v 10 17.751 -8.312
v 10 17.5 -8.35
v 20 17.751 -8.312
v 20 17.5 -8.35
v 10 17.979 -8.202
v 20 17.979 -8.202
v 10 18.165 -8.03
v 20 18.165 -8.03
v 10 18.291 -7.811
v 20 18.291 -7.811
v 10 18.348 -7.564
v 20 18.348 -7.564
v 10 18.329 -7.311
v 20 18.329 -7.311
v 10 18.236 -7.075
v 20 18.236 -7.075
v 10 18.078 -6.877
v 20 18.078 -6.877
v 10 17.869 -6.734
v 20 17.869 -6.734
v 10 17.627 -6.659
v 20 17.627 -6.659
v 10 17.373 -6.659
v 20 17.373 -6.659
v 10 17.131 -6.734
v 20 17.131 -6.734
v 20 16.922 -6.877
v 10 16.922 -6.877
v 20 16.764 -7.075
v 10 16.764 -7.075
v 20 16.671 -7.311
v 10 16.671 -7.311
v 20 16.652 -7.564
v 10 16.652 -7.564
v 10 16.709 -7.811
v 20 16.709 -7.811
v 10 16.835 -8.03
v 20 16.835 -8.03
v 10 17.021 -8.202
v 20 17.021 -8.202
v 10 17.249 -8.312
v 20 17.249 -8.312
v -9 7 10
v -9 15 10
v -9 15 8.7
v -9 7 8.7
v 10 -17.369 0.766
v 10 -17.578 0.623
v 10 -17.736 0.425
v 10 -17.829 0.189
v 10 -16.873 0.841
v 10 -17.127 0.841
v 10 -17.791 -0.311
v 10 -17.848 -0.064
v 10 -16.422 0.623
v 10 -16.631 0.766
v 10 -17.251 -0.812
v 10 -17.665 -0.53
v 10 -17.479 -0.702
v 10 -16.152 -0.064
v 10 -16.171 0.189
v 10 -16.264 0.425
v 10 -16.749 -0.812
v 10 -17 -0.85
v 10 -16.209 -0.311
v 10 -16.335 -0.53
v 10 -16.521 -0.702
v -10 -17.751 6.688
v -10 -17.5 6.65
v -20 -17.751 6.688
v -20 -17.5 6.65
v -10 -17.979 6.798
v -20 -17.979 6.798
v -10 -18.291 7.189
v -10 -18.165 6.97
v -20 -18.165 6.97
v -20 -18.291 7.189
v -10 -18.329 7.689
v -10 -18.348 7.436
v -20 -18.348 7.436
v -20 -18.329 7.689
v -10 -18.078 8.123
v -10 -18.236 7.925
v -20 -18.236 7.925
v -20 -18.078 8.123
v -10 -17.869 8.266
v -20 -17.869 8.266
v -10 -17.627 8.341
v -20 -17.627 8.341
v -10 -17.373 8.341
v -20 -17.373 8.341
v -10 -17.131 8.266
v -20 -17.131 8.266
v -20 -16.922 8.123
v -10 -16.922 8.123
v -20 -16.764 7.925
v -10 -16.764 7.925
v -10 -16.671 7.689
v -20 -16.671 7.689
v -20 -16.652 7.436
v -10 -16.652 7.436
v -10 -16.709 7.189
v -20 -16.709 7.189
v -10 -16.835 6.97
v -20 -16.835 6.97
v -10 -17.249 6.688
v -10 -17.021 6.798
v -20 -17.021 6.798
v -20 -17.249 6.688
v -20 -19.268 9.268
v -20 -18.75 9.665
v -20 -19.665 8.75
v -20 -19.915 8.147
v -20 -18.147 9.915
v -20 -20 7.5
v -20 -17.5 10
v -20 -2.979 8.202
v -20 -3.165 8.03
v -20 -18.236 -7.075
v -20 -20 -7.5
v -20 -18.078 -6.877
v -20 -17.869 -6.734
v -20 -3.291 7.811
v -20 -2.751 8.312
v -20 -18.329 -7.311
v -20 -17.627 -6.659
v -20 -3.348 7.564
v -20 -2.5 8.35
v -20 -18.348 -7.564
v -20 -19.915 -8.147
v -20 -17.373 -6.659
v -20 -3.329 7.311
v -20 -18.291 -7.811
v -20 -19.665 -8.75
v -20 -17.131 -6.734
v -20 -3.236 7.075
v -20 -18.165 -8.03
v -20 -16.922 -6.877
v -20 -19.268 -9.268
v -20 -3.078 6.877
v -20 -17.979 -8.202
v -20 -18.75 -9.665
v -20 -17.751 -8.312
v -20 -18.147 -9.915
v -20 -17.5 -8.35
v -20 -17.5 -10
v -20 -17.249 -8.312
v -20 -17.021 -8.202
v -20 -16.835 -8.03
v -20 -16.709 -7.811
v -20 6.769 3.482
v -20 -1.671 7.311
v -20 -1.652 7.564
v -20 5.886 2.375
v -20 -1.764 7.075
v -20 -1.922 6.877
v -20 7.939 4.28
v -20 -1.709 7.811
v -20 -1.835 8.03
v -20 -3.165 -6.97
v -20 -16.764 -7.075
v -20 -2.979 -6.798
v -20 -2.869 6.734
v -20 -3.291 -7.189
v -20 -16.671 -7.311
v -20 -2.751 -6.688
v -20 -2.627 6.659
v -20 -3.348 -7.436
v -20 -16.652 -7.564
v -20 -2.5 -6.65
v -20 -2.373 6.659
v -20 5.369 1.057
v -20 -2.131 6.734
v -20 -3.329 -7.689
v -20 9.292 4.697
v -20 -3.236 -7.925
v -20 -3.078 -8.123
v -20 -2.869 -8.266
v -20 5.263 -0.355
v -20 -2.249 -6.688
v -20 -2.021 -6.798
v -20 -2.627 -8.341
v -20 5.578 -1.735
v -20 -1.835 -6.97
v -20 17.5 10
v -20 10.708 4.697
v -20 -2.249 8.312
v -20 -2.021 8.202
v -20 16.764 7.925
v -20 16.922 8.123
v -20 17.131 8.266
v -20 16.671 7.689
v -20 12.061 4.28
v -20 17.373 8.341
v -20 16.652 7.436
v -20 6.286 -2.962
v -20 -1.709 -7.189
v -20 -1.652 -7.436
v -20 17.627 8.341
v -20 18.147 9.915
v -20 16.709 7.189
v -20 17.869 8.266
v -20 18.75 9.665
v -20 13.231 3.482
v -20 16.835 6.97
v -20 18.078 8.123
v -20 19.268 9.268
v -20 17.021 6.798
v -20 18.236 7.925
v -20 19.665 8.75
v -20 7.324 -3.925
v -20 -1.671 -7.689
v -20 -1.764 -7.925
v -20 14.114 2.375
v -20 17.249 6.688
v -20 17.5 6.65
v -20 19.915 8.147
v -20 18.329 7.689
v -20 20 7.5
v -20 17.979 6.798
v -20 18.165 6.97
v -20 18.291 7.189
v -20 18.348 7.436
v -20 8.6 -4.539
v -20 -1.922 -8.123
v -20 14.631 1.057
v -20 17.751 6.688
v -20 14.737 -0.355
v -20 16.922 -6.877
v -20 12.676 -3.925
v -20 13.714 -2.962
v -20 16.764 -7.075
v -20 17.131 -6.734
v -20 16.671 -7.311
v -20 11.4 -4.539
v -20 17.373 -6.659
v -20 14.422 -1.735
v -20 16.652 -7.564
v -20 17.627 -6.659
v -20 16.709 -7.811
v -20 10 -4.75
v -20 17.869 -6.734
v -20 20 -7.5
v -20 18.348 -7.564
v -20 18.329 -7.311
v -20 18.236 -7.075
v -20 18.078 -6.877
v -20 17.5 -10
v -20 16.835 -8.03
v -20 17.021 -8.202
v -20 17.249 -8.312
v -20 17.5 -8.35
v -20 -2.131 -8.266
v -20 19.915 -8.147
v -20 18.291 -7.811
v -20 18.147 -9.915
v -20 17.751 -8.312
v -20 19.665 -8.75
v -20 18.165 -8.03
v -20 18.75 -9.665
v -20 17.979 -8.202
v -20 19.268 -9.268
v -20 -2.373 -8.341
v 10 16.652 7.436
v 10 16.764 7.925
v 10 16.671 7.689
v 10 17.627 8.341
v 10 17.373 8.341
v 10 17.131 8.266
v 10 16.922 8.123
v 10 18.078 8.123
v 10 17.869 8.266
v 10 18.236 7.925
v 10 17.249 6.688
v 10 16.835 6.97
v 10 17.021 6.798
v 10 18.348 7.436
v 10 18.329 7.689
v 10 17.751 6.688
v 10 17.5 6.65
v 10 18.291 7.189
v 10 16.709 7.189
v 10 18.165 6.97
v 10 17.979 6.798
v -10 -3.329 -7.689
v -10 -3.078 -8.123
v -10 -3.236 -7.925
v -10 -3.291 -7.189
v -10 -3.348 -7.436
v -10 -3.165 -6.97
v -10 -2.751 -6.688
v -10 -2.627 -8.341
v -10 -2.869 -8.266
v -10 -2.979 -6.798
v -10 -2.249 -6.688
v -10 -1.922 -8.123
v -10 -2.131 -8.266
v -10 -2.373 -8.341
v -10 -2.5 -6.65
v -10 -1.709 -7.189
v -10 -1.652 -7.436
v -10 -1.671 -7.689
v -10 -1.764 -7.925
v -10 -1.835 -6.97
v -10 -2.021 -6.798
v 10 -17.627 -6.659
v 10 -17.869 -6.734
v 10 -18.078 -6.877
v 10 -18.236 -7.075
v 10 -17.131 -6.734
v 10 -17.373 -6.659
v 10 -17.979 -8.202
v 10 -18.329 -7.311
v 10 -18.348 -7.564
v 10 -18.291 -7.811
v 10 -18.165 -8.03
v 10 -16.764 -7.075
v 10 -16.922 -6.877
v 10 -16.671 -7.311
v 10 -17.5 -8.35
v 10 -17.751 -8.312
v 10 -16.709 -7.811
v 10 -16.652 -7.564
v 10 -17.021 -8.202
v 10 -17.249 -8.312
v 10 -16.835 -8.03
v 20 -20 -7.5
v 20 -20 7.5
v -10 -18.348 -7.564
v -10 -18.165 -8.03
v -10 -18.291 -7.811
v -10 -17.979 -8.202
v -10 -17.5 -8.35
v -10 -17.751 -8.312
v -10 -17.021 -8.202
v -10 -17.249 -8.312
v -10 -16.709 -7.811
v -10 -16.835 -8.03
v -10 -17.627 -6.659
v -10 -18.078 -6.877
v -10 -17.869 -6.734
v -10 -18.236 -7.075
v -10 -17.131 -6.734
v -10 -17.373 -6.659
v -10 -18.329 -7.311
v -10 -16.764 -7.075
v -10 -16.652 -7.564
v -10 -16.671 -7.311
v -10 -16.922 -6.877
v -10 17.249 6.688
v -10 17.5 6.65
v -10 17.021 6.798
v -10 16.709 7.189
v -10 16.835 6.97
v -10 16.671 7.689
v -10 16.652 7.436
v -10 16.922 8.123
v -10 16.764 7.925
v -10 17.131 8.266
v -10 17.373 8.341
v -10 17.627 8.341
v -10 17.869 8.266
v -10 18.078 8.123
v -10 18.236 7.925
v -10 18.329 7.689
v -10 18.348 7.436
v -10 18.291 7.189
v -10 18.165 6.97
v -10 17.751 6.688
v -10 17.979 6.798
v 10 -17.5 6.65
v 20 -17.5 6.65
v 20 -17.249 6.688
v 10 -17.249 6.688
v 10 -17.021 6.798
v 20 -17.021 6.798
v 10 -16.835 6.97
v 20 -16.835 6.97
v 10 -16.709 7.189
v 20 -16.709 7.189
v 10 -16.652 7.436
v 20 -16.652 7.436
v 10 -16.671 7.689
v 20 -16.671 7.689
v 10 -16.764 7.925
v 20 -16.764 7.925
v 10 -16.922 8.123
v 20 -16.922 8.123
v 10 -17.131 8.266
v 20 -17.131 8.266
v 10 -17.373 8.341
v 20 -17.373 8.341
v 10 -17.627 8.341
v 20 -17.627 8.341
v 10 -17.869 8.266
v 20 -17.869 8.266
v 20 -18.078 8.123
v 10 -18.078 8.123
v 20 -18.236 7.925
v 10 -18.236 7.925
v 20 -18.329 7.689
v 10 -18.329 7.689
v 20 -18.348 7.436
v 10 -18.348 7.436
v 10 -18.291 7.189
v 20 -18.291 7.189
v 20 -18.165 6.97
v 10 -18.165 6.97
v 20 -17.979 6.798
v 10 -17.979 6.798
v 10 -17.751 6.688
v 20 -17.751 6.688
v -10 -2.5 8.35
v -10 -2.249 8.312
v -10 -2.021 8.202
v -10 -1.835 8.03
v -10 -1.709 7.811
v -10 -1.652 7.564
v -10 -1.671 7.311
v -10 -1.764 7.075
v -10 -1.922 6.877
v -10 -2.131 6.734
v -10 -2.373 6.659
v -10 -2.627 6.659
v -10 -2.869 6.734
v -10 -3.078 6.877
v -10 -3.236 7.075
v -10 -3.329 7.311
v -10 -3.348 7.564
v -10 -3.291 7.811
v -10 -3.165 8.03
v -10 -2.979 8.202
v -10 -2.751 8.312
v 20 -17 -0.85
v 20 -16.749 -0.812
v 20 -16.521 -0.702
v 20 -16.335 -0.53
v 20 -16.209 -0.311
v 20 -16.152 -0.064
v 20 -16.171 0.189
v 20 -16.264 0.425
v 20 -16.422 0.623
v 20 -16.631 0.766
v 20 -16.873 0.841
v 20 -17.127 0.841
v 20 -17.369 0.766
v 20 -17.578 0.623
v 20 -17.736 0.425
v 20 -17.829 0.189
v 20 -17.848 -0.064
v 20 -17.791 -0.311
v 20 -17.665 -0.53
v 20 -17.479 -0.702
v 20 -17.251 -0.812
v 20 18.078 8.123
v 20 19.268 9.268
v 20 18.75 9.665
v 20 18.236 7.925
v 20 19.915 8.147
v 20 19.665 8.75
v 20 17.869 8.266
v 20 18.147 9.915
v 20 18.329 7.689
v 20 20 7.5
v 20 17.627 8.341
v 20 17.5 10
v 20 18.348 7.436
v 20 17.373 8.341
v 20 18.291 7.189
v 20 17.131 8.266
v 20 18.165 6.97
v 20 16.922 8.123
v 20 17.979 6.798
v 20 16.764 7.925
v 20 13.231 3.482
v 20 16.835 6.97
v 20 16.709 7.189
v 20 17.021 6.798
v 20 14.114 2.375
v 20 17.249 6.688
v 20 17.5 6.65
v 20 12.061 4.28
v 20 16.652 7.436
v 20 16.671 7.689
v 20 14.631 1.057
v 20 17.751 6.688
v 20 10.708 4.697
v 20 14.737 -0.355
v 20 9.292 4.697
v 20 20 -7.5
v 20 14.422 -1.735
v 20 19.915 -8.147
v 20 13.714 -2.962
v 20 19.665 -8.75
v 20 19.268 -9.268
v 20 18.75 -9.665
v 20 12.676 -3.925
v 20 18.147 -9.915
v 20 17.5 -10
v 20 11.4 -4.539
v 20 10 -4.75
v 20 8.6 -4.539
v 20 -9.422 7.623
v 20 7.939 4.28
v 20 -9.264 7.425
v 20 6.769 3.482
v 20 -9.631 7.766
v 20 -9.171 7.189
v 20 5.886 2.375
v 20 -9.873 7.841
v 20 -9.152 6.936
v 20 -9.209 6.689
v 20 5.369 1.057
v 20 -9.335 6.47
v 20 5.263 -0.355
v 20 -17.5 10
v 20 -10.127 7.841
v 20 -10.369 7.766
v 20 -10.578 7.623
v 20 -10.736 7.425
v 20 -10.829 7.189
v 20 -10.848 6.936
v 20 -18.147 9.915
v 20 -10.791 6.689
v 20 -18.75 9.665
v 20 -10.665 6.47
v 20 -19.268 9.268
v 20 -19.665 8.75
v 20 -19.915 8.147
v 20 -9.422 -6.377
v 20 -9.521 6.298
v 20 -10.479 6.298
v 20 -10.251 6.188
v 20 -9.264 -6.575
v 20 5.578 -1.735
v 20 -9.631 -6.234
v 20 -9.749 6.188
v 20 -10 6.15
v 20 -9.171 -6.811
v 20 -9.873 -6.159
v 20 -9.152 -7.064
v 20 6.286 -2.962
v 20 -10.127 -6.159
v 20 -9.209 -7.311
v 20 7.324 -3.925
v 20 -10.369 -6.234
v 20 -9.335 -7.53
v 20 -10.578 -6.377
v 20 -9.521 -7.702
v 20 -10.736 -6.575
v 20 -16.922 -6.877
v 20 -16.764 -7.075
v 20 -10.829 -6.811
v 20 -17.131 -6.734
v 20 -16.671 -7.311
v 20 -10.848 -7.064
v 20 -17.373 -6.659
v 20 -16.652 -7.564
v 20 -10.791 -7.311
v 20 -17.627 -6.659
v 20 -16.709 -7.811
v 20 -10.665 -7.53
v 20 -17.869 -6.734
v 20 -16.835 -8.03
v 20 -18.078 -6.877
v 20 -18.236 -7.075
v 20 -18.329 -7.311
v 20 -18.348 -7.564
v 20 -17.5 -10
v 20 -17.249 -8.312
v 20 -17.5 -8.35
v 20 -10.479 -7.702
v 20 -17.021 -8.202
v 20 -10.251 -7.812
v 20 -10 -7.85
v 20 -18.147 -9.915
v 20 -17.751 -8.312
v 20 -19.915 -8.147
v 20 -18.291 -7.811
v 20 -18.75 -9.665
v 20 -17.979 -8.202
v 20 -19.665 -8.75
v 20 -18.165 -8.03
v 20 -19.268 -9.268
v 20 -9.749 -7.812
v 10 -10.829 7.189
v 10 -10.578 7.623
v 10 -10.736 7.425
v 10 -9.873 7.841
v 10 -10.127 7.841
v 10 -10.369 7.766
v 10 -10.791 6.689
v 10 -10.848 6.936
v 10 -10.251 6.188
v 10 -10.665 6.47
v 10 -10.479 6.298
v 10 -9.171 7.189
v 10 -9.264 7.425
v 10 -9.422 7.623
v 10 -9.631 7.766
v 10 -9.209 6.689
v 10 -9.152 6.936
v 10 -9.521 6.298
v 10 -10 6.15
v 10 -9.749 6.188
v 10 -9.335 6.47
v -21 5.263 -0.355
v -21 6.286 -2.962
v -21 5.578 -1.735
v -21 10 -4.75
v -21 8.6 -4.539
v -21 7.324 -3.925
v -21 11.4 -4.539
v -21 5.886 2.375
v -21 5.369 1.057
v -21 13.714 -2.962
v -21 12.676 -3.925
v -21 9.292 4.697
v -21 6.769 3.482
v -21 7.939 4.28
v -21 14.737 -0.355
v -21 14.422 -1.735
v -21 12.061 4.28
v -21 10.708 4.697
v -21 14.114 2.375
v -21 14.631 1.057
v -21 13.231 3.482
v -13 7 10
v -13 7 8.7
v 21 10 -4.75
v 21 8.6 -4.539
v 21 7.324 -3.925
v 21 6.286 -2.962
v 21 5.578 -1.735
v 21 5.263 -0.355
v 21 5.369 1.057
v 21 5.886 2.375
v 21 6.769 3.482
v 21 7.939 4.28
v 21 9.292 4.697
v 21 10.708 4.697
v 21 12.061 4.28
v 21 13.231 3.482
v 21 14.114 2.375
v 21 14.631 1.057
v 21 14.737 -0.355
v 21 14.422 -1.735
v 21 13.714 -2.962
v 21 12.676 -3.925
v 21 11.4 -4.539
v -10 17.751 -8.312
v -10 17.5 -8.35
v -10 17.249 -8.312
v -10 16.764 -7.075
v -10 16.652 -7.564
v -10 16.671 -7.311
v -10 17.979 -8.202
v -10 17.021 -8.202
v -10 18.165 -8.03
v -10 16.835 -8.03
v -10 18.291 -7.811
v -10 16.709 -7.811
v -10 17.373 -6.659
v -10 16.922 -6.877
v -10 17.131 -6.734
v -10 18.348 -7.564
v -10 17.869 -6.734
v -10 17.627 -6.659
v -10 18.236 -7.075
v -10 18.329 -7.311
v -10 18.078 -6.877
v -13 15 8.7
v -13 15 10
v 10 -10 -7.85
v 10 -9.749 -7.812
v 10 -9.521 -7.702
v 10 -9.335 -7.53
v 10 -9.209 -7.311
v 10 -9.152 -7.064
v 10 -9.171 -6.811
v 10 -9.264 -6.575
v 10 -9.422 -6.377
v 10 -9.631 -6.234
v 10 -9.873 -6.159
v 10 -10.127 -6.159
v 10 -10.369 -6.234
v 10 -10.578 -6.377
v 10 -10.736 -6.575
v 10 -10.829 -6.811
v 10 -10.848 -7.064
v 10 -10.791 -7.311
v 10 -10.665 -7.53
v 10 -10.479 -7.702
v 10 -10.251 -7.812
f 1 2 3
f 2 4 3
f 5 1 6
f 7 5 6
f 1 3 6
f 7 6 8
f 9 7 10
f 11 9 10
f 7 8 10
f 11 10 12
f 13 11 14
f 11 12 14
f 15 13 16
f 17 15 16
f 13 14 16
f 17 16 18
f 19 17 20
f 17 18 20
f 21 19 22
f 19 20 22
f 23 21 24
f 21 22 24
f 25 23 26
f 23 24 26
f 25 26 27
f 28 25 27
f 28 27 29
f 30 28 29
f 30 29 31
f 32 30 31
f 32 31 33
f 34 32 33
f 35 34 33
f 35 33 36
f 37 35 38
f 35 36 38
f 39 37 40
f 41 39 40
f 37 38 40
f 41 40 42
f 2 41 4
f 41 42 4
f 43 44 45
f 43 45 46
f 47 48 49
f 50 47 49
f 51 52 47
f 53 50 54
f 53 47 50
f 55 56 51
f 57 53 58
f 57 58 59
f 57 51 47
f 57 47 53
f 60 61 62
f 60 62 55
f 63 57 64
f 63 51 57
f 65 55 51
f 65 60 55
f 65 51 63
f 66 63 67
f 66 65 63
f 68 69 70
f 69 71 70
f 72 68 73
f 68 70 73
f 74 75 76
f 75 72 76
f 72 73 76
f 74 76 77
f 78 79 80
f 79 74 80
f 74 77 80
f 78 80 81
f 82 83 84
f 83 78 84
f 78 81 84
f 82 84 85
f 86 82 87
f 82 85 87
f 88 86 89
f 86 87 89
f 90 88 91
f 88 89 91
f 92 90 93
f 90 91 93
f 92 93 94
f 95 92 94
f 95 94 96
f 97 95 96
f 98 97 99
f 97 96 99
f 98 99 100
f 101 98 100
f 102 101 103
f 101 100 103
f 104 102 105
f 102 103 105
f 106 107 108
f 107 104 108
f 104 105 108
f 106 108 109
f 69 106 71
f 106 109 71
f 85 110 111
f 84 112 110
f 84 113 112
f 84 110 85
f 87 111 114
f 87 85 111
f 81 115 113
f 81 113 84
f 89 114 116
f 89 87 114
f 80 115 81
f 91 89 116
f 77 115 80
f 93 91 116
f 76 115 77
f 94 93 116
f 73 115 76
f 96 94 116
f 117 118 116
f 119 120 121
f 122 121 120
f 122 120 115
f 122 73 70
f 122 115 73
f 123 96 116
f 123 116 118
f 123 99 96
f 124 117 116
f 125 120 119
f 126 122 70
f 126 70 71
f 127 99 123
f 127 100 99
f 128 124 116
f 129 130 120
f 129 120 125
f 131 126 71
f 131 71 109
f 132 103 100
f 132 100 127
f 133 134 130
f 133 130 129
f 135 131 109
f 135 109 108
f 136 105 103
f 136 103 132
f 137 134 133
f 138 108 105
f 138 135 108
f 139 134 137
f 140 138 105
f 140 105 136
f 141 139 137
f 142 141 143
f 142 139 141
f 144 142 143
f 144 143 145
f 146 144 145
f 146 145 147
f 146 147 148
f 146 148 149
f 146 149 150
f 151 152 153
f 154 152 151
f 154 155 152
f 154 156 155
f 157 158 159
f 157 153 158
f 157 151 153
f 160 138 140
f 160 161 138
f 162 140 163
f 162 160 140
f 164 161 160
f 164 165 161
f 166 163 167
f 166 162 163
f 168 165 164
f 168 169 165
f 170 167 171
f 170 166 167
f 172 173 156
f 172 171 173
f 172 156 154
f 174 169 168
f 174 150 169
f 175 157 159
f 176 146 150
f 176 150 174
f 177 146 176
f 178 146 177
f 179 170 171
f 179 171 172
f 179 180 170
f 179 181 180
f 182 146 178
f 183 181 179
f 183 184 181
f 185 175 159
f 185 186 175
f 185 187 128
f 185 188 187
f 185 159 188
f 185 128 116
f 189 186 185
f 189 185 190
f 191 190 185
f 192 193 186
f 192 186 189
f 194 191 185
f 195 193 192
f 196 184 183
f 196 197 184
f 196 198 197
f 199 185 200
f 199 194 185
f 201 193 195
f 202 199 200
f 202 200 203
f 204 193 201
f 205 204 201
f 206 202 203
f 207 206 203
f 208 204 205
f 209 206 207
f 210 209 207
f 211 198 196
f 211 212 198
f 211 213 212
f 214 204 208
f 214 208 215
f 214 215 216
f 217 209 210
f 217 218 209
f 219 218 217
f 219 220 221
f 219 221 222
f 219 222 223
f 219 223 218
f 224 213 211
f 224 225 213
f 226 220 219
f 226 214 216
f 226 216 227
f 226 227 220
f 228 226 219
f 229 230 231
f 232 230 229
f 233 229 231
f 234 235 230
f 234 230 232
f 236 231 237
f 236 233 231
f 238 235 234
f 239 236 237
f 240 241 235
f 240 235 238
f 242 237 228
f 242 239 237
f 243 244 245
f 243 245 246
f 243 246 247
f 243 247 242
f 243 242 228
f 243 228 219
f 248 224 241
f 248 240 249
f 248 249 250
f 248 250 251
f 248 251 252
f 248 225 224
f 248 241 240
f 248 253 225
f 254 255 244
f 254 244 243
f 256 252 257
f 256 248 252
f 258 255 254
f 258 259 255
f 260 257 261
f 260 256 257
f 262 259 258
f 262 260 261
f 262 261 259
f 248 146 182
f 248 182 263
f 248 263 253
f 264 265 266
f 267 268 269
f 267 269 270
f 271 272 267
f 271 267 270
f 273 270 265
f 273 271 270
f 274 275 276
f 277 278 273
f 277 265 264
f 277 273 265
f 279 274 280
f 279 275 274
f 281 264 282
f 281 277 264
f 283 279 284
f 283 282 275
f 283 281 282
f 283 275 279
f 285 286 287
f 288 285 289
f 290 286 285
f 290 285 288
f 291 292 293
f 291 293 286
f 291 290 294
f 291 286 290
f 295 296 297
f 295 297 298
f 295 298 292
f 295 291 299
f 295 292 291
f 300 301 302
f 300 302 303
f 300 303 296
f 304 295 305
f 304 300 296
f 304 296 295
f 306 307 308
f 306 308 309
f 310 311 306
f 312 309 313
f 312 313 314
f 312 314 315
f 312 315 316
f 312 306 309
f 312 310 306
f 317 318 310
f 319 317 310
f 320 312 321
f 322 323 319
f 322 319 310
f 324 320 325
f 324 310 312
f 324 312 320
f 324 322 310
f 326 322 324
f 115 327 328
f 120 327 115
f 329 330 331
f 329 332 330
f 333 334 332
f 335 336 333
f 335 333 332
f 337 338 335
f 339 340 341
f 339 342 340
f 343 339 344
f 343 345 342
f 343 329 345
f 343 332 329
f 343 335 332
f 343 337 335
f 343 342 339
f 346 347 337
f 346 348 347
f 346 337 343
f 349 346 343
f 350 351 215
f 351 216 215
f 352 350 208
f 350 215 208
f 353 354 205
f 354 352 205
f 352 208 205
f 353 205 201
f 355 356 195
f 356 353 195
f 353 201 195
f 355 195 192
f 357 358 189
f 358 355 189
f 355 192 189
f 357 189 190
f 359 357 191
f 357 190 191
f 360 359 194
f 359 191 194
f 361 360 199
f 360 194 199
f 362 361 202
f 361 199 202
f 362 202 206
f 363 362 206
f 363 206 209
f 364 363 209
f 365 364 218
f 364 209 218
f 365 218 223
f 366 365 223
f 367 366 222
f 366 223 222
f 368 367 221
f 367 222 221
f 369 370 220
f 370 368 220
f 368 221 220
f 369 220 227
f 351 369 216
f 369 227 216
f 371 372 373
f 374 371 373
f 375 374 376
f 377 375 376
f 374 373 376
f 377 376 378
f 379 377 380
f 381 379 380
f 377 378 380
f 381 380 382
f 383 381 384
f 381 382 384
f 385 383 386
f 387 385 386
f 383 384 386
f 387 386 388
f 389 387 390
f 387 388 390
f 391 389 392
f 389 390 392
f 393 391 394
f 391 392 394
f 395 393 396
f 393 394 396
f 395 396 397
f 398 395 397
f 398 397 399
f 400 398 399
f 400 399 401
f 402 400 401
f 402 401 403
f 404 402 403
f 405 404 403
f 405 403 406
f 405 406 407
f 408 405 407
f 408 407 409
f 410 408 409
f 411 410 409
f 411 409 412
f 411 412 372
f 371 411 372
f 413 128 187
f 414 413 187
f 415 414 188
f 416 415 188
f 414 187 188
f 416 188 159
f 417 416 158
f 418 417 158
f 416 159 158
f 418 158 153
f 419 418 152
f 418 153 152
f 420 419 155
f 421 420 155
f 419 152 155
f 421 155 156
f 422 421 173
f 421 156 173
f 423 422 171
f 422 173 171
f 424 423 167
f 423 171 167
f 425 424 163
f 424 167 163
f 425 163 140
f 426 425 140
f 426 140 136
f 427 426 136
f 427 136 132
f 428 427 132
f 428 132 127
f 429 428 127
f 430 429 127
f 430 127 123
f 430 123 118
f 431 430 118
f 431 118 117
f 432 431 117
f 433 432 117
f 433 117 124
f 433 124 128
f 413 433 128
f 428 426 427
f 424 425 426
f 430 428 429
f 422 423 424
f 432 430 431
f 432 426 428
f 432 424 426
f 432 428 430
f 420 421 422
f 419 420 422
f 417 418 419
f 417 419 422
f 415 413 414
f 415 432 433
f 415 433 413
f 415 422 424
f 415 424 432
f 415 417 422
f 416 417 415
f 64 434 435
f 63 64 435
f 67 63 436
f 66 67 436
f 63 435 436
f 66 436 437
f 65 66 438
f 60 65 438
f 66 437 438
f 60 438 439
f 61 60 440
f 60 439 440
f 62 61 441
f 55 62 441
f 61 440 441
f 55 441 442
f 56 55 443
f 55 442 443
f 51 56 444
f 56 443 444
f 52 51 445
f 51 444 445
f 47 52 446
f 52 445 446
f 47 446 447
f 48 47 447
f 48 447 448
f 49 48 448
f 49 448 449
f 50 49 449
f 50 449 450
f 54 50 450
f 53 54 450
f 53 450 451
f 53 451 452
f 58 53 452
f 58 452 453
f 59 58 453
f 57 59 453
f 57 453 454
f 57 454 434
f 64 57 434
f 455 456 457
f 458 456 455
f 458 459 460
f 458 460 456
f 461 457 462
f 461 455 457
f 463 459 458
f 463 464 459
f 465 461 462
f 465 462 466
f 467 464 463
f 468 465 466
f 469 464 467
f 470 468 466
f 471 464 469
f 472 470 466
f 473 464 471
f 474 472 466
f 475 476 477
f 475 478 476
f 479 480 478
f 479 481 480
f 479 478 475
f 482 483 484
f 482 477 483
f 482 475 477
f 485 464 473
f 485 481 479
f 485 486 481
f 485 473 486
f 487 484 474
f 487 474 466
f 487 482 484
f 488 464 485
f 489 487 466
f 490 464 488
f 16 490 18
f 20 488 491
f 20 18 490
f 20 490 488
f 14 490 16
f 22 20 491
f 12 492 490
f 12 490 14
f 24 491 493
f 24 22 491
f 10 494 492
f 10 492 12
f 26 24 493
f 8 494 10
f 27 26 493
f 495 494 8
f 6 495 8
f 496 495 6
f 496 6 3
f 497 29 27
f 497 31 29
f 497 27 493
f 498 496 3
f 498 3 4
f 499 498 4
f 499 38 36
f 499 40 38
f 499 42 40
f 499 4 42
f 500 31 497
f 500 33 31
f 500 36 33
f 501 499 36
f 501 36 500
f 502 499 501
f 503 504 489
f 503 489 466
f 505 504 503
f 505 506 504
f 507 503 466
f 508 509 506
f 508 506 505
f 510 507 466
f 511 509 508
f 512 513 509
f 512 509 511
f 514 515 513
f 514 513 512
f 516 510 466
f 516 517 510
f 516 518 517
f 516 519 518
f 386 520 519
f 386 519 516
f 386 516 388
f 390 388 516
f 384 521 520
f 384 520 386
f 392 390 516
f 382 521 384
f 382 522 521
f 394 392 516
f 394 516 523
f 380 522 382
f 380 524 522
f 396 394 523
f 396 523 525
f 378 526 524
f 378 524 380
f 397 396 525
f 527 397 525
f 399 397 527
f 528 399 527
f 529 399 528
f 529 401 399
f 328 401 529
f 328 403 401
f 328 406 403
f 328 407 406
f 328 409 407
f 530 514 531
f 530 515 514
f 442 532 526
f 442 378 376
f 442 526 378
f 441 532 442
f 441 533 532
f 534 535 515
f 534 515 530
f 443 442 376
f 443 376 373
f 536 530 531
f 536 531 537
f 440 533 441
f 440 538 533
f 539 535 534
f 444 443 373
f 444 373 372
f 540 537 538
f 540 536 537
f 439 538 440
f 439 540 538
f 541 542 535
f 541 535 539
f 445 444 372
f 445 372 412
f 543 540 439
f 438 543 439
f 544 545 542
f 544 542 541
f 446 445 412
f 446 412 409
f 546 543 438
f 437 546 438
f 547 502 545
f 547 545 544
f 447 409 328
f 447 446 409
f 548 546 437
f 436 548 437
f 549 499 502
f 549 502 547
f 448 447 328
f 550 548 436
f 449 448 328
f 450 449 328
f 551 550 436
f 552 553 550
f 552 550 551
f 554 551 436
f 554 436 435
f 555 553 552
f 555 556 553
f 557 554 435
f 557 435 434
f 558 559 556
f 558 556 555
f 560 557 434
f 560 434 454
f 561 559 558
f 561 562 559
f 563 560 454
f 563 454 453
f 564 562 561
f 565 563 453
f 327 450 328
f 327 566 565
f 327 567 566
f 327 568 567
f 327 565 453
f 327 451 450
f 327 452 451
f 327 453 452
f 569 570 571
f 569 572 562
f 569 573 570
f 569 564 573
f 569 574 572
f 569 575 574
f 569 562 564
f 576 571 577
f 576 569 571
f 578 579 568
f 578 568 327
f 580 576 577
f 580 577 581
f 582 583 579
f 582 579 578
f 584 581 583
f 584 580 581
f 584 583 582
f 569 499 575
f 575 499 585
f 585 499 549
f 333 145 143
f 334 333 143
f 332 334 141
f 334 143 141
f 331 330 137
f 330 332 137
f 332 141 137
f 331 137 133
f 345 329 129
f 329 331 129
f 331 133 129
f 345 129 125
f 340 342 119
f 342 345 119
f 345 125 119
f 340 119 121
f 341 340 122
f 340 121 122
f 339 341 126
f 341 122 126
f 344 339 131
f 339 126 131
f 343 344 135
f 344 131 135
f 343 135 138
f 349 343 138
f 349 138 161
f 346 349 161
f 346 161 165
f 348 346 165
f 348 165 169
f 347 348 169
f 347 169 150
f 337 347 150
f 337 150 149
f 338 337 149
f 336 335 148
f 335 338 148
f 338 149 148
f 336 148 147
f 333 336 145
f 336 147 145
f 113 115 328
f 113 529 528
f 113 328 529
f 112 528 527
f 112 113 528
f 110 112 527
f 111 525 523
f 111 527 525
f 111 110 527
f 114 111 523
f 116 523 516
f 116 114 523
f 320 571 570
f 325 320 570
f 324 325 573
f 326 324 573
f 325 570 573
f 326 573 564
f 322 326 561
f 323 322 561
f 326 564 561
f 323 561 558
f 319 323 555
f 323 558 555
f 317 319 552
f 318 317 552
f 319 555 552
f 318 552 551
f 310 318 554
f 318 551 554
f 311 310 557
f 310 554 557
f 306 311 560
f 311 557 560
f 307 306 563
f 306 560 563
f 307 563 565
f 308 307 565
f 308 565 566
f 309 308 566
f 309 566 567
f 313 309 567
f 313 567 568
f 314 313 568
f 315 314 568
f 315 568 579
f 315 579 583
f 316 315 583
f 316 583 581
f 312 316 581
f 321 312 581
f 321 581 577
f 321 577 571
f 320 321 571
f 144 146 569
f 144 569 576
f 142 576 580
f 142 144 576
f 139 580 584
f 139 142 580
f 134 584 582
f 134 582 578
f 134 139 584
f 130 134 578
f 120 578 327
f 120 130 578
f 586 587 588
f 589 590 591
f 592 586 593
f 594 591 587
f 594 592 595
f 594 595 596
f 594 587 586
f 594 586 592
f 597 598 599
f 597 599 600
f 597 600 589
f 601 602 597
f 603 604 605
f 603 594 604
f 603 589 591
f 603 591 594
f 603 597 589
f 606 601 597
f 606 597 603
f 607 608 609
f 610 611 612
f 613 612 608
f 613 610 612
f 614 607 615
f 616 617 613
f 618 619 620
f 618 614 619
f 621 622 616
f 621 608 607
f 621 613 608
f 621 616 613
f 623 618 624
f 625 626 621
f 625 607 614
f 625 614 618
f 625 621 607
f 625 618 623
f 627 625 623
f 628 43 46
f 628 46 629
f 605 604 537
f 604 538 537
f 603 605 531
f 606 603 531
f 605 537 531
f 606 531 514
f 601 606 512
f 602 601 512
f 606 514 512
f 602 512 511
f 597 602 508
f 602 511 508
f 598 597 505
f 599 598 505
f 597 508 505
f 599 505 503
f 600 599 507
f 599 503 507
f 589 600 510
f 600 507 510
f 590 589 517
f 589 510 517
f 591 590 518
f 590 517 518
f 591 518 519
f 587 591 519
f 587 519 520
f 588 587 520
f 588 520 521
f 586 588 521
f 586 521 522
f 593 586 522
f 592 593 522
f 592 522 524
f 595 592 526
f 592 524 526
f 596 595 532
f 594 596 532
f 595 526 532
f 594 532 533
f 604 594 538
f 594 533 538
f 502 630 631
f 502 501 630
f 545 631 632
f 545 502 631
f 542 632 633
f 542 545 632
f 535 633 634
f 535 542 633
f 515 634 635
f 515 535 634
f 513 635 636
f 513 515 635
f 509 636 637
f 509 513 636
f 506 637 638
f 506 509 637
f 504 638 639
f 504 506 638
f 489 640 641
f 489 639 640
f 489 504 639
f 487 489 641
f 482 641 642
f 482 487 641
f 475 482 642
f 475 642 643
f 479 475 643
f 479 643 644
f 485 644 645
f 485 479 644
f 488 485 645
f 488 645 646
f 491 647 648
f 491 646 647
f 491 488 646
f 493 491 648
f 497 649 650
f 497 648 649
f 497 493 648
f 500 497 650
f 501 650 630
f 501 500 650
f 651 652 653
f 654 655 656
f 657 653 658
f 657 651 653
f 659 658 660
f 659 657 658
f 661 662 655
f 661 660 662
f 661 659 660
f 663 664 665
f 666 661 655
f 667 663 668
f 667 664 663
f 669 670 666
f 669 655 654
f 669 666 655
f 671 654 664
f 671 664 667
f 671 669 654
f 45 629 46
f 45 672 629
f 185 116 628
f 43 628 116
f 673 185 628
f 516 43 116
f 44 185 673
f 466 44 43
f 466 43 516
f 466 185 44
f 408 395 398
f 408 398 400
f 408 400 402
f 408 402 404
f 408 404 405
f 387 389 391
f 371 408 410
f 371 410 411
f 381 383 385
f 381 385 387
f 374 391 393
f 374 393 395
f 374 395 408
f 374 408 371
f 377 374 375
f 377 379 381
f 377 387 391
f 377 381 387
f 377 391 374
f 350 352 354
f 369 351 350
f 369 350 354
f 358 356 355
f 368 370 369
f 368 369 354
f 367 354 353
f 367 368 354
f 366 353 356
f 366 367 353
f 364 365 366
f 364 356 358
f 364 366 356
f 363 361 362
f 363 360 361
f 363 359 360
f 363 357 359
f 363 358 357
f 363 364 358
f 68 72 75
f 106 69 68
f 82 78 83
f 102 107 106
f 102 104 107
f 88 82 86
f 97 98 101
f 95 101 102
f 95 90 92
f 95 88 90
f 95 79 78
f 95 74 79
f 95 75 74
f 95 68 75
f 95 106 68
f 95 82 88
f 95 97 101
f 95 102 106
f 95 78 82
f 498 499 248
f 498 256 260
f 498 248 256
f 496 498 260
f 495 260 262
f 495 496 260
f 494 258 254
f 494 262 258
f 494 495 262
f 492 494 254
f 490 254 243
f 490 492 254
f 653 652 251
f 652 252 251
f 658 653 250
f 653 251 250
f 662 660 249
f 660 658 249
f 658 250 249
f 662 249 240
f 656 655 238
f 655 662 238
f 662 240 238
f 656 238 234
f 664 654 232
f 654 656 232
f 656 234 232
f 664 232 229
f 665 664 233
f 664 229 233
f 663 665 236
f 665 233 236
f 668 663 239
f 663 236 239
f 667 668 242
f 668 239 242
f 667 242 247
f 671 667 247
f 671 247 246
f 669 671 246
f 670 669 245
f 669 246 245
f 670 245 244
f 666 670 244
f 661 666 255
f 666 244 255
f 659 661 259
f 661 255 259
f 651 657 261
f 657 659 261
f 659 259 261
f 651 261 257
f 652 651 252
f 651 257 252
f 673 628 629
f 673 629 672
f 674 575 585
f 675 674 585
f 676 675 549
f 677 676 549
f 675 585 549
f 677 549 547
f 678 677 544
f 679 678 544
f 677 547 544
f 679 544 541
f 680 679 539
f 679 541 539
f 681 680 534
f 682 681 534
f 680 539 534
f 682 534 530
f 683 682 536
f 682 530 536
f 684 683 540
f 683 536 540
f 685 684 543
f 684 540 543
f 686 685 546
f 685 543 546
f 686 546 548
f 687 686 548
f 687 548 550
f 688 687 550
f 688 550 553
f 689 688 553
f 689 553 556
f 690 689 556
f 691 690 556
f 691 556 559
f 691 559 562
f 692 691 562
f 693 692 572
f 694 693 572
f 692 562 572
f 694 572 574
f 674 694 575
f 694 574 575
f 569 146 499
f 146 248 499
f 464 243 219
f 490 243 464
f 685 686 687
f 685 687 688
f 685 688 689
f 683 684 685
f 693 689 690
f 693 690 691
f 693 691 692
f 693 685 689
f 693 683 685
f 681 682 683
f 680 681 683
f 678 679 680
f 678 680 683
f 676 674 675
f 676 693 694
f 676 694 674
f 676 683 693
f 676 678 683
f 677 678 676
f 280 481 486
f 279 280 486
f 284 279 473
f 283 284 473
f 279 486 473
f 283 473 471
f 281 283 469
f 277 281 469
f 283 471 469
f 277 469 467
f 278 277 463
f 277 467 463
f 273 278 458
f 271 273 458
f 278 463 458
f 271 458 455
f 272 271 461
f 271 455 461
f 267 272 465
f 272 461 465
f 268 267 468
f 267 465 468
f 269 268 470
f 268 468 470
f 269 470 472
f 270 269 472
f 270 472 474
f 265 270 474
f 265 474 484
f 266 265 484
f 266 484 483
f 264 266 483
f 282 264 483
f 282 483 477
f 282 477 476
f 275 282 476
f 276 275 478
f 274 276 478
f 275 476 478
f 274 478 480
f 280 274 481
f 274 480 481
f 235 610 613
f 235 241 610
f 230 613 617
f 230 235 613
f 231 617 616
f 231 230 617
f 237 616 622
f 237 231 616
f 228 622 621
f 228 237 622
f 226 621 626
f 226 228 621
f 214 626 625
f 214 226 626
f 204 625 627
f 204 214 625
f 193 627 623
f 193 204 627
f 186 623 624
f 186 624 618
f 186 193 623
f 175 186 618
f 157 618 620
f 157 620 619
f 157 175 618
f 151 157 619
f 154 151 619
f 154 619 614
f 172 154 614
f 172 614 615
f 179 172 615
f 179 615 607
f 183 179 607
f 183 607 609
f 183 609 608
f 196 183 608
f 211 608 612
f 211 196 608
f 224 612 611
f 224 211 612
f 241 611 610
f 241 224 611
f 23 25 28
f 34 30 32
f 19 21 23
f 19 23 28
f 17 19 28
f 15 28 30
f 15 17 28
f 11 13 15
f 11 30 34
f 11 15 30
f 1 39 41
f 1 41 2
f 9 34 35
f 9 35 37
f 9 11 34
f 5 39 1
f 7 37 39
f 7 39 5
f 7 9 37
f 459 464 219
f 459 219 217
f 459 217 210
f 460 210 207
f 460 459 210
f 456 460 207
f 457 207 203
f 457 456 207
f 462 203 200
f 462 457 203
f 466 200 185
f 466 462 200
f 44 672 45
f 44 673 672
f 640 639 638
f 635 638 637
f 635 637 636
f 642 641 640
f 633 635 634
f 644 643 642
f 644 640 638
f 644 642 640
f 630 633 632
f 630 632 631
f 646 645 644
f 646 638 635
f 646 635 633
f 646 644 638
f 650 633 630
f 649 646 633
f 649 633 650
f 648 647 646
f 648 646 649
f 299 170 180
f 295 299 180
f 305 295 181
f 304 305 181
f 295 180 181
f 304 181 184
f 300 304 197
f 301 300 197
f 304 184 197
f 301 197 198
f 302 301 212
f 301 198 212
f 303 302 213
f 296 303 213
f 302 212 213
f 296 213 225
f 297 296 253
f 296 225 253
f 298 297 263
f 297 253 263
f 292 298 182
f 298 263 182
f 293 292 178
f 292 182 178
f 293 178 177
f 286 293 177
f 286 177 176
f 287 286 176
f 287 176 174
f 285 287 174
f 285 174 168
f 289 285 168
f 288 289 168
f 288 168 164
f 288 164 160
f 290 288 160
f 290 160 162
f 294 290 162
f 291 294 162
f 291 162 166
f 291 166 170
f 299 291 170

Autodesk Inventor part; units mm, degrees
ref_plane "YZ Plane" through (0, 0, 0) normal (1, 0, 0) x (0, 1, 0)
ref_plane "XZ Plane" through (0, 0, 0) normal (0, 1, 0) x (-1, 0, 0)
ref_plane "XY Plane" through (0, 0, 0) normal (0, 0, 1) x (1, 0, 0)
sketch "Base" plane through (0, 0, 0) normal (0, 0, 1) x (1, 0, 0)
  line L0 (-20, 20) -> (20, 20)
  line L1 (20, 20) -> (20, -20)
  line L2 (20, -20) -> (-20, -20)
  line L3 (-20, -20) -> (-20, 20)
  line L4 (0, 20) -> (0, -20) construction
  point P0 (0, 0)
  point P1 (0, 0)
  dimension "d0" = 40
  dimension "d1" = 40
extrude "BaseFeature" add sketch "Base" along normal mid plane 20
sketch "Axis" plane through (20, -20, 10) normal (1, 0, 0) x (0, 0, -1)
  circle A0 centre (10, 30) radius 10 construction
  line L0 (20, 40) -> (0, 40) construction
  line L1 (0, 0) -> (0, 40) construction
  circle A1 centre (10, 30) radius 4.75
  line L2 (20, 40) -> (20, 0) projected
  point P0 (10, 20)
  dimension "d4" = 9.5
extrude "AxisFeature" add sketch "Axis" along normal blind 1
mirror "AxisMirrorFeature" about plane through (0, 0, 0) normal (1, 0, 0) of "AxisFeature"
sketch "Sketch3" plane through (0, 0, 10) normal (0, 0, 1) x (1, 0, 0)
  line L0 (-13, 15) -> (-9, 15)
  line L1 (-9, 15) -> (-9, 7)
  line L2 (-9, 7) -> (-13, 7)
  line L3 (-13, 7) -> (-13, 15)
  line L4 (20, 20) -> (-20, 20) projected
  line L5 (-20, 20) -> (-20, -20) projected
  point P0 (0, 0)
  point P1 (-11, 15)
  dimension "d7" = 8
  dimension "d8" = 4
  dimension "d9" = 5
  dimension "d10" = 7
extrude "Extrusion3" cut sketch "Sketch3" against normal blind 1.3
fillet "Fillet1" radius 2.5 4 edges at (0, 20, 10) (0, -20, 10) (0, -20, -10) (0, 20, -10)
sketch "Sketch4" plane through (20, -17.5, 10) normal (1, 0, 0) x (0, 0, -1)
  arc A0 (2.5, 37.5) -> (0, 35) centre (2.5, 35) ccw projected
  arc A1 (20, 35) -> (17.5, 37.5) centre (17.5, 35) ccw projected
  arc A2 (0, 0) -> (2.5, -2.5) centre (2.5, 0) ccw projected
  arc A3 (17.5, -2.5) -> (20, 0) centre (17.5, 0) ccw projected
  circle A4 centre (2.5, 35) radius 0.85
  circle A5 centre (17.5, 35) radius 0.85
  circle A6 centre (2.5, 0) radius 0.85
  circle A7 centre (17.5, 0) radius 0.85
  point P0 (10, 17.5)
  dimension "d14" = 1.7
extrude "Extrusion4" cut sketch "Sketch4" against normal blind 10
mirror "Mirror2" about plane through (0, 0, 0) normal (1, 0, 0) of "Extrusion4"
sketch "Sketch6" plane through (-20, -17.5, -10) normal (-1, 0, 0) x (0, 0, 1)
  circle A0 centre (17.5, 0) radius 0.85 construction
  circle A1 centre (2.5, 0) radius 0.85 construction
  line L0 (17.5, 0) -> (2.5, 0) construction
  line L1 (2.5, 0) -> (2.5, 15) construction
  line L2 (2.5, 15) -> (17.5, 15) construction
  line L3 (17.5, 15) -> (17.5, 0) construction
  circle A2 centre (17.5, 15) radius 0.85
  circle A3 centre (2.5, 15) radius 0.85
  point P0 (10, 17.5)
  dimension "d18" = 15
extrude "Extrusion5" cut sketch "Sketch6" against normal blind 10
sketch "Sketch7" plane through (20, -17.5, 10) normal (1, 0, 0) x (0, 0, -1)
  line L0 (0, 0) -> (0, 35) construction
  line L1 (20, 35) -> (20, 0) construction
  circle A0 centre (10, 7.5) radius 10 construction
  line L2 (17.5, -2.5) -> (2.5, -2.5) construction
  circle A1 centre (10, 7.5) radius 4 construction
  line L3 (10, 17.5) -> (10, -2.5) construction
  line L4 (0, 7.5) -> (20, 7.5) construction
  line L5 (10, 11.5) -> (10, 17.5) construction
  circle A2 centre (10, 14.5) radius 0.85
  line L6 (10, 3.5) -> (10, -2.5) construction
  line L7 (20, 0) -> (20, 35) projected
  circle A3 centre (10, 0.5) radius 0.85
  line L8 (0, 7.5) -> (6, 7.5) construction
  line L9 (14, 7.5) -> (20, 7.5) construction
  circle A4 centre (3, 7.5) radius 0.85
  circle A5 centre (17, 7.5) radius 0.85
  circle A6 centre (2.5, 0) radius 0.85 projected
  dimension "d21" = 8
extrude "Extrusion6" cut sketch "Sketch7" against normal blind 10 contours A3 | A4 | A5
ref_plane "Work Plane1" through (0, 0, 0) normal (1, 0, 0) x (0, 1, 0)
properties part number "FeeTechSTS3025BL"
